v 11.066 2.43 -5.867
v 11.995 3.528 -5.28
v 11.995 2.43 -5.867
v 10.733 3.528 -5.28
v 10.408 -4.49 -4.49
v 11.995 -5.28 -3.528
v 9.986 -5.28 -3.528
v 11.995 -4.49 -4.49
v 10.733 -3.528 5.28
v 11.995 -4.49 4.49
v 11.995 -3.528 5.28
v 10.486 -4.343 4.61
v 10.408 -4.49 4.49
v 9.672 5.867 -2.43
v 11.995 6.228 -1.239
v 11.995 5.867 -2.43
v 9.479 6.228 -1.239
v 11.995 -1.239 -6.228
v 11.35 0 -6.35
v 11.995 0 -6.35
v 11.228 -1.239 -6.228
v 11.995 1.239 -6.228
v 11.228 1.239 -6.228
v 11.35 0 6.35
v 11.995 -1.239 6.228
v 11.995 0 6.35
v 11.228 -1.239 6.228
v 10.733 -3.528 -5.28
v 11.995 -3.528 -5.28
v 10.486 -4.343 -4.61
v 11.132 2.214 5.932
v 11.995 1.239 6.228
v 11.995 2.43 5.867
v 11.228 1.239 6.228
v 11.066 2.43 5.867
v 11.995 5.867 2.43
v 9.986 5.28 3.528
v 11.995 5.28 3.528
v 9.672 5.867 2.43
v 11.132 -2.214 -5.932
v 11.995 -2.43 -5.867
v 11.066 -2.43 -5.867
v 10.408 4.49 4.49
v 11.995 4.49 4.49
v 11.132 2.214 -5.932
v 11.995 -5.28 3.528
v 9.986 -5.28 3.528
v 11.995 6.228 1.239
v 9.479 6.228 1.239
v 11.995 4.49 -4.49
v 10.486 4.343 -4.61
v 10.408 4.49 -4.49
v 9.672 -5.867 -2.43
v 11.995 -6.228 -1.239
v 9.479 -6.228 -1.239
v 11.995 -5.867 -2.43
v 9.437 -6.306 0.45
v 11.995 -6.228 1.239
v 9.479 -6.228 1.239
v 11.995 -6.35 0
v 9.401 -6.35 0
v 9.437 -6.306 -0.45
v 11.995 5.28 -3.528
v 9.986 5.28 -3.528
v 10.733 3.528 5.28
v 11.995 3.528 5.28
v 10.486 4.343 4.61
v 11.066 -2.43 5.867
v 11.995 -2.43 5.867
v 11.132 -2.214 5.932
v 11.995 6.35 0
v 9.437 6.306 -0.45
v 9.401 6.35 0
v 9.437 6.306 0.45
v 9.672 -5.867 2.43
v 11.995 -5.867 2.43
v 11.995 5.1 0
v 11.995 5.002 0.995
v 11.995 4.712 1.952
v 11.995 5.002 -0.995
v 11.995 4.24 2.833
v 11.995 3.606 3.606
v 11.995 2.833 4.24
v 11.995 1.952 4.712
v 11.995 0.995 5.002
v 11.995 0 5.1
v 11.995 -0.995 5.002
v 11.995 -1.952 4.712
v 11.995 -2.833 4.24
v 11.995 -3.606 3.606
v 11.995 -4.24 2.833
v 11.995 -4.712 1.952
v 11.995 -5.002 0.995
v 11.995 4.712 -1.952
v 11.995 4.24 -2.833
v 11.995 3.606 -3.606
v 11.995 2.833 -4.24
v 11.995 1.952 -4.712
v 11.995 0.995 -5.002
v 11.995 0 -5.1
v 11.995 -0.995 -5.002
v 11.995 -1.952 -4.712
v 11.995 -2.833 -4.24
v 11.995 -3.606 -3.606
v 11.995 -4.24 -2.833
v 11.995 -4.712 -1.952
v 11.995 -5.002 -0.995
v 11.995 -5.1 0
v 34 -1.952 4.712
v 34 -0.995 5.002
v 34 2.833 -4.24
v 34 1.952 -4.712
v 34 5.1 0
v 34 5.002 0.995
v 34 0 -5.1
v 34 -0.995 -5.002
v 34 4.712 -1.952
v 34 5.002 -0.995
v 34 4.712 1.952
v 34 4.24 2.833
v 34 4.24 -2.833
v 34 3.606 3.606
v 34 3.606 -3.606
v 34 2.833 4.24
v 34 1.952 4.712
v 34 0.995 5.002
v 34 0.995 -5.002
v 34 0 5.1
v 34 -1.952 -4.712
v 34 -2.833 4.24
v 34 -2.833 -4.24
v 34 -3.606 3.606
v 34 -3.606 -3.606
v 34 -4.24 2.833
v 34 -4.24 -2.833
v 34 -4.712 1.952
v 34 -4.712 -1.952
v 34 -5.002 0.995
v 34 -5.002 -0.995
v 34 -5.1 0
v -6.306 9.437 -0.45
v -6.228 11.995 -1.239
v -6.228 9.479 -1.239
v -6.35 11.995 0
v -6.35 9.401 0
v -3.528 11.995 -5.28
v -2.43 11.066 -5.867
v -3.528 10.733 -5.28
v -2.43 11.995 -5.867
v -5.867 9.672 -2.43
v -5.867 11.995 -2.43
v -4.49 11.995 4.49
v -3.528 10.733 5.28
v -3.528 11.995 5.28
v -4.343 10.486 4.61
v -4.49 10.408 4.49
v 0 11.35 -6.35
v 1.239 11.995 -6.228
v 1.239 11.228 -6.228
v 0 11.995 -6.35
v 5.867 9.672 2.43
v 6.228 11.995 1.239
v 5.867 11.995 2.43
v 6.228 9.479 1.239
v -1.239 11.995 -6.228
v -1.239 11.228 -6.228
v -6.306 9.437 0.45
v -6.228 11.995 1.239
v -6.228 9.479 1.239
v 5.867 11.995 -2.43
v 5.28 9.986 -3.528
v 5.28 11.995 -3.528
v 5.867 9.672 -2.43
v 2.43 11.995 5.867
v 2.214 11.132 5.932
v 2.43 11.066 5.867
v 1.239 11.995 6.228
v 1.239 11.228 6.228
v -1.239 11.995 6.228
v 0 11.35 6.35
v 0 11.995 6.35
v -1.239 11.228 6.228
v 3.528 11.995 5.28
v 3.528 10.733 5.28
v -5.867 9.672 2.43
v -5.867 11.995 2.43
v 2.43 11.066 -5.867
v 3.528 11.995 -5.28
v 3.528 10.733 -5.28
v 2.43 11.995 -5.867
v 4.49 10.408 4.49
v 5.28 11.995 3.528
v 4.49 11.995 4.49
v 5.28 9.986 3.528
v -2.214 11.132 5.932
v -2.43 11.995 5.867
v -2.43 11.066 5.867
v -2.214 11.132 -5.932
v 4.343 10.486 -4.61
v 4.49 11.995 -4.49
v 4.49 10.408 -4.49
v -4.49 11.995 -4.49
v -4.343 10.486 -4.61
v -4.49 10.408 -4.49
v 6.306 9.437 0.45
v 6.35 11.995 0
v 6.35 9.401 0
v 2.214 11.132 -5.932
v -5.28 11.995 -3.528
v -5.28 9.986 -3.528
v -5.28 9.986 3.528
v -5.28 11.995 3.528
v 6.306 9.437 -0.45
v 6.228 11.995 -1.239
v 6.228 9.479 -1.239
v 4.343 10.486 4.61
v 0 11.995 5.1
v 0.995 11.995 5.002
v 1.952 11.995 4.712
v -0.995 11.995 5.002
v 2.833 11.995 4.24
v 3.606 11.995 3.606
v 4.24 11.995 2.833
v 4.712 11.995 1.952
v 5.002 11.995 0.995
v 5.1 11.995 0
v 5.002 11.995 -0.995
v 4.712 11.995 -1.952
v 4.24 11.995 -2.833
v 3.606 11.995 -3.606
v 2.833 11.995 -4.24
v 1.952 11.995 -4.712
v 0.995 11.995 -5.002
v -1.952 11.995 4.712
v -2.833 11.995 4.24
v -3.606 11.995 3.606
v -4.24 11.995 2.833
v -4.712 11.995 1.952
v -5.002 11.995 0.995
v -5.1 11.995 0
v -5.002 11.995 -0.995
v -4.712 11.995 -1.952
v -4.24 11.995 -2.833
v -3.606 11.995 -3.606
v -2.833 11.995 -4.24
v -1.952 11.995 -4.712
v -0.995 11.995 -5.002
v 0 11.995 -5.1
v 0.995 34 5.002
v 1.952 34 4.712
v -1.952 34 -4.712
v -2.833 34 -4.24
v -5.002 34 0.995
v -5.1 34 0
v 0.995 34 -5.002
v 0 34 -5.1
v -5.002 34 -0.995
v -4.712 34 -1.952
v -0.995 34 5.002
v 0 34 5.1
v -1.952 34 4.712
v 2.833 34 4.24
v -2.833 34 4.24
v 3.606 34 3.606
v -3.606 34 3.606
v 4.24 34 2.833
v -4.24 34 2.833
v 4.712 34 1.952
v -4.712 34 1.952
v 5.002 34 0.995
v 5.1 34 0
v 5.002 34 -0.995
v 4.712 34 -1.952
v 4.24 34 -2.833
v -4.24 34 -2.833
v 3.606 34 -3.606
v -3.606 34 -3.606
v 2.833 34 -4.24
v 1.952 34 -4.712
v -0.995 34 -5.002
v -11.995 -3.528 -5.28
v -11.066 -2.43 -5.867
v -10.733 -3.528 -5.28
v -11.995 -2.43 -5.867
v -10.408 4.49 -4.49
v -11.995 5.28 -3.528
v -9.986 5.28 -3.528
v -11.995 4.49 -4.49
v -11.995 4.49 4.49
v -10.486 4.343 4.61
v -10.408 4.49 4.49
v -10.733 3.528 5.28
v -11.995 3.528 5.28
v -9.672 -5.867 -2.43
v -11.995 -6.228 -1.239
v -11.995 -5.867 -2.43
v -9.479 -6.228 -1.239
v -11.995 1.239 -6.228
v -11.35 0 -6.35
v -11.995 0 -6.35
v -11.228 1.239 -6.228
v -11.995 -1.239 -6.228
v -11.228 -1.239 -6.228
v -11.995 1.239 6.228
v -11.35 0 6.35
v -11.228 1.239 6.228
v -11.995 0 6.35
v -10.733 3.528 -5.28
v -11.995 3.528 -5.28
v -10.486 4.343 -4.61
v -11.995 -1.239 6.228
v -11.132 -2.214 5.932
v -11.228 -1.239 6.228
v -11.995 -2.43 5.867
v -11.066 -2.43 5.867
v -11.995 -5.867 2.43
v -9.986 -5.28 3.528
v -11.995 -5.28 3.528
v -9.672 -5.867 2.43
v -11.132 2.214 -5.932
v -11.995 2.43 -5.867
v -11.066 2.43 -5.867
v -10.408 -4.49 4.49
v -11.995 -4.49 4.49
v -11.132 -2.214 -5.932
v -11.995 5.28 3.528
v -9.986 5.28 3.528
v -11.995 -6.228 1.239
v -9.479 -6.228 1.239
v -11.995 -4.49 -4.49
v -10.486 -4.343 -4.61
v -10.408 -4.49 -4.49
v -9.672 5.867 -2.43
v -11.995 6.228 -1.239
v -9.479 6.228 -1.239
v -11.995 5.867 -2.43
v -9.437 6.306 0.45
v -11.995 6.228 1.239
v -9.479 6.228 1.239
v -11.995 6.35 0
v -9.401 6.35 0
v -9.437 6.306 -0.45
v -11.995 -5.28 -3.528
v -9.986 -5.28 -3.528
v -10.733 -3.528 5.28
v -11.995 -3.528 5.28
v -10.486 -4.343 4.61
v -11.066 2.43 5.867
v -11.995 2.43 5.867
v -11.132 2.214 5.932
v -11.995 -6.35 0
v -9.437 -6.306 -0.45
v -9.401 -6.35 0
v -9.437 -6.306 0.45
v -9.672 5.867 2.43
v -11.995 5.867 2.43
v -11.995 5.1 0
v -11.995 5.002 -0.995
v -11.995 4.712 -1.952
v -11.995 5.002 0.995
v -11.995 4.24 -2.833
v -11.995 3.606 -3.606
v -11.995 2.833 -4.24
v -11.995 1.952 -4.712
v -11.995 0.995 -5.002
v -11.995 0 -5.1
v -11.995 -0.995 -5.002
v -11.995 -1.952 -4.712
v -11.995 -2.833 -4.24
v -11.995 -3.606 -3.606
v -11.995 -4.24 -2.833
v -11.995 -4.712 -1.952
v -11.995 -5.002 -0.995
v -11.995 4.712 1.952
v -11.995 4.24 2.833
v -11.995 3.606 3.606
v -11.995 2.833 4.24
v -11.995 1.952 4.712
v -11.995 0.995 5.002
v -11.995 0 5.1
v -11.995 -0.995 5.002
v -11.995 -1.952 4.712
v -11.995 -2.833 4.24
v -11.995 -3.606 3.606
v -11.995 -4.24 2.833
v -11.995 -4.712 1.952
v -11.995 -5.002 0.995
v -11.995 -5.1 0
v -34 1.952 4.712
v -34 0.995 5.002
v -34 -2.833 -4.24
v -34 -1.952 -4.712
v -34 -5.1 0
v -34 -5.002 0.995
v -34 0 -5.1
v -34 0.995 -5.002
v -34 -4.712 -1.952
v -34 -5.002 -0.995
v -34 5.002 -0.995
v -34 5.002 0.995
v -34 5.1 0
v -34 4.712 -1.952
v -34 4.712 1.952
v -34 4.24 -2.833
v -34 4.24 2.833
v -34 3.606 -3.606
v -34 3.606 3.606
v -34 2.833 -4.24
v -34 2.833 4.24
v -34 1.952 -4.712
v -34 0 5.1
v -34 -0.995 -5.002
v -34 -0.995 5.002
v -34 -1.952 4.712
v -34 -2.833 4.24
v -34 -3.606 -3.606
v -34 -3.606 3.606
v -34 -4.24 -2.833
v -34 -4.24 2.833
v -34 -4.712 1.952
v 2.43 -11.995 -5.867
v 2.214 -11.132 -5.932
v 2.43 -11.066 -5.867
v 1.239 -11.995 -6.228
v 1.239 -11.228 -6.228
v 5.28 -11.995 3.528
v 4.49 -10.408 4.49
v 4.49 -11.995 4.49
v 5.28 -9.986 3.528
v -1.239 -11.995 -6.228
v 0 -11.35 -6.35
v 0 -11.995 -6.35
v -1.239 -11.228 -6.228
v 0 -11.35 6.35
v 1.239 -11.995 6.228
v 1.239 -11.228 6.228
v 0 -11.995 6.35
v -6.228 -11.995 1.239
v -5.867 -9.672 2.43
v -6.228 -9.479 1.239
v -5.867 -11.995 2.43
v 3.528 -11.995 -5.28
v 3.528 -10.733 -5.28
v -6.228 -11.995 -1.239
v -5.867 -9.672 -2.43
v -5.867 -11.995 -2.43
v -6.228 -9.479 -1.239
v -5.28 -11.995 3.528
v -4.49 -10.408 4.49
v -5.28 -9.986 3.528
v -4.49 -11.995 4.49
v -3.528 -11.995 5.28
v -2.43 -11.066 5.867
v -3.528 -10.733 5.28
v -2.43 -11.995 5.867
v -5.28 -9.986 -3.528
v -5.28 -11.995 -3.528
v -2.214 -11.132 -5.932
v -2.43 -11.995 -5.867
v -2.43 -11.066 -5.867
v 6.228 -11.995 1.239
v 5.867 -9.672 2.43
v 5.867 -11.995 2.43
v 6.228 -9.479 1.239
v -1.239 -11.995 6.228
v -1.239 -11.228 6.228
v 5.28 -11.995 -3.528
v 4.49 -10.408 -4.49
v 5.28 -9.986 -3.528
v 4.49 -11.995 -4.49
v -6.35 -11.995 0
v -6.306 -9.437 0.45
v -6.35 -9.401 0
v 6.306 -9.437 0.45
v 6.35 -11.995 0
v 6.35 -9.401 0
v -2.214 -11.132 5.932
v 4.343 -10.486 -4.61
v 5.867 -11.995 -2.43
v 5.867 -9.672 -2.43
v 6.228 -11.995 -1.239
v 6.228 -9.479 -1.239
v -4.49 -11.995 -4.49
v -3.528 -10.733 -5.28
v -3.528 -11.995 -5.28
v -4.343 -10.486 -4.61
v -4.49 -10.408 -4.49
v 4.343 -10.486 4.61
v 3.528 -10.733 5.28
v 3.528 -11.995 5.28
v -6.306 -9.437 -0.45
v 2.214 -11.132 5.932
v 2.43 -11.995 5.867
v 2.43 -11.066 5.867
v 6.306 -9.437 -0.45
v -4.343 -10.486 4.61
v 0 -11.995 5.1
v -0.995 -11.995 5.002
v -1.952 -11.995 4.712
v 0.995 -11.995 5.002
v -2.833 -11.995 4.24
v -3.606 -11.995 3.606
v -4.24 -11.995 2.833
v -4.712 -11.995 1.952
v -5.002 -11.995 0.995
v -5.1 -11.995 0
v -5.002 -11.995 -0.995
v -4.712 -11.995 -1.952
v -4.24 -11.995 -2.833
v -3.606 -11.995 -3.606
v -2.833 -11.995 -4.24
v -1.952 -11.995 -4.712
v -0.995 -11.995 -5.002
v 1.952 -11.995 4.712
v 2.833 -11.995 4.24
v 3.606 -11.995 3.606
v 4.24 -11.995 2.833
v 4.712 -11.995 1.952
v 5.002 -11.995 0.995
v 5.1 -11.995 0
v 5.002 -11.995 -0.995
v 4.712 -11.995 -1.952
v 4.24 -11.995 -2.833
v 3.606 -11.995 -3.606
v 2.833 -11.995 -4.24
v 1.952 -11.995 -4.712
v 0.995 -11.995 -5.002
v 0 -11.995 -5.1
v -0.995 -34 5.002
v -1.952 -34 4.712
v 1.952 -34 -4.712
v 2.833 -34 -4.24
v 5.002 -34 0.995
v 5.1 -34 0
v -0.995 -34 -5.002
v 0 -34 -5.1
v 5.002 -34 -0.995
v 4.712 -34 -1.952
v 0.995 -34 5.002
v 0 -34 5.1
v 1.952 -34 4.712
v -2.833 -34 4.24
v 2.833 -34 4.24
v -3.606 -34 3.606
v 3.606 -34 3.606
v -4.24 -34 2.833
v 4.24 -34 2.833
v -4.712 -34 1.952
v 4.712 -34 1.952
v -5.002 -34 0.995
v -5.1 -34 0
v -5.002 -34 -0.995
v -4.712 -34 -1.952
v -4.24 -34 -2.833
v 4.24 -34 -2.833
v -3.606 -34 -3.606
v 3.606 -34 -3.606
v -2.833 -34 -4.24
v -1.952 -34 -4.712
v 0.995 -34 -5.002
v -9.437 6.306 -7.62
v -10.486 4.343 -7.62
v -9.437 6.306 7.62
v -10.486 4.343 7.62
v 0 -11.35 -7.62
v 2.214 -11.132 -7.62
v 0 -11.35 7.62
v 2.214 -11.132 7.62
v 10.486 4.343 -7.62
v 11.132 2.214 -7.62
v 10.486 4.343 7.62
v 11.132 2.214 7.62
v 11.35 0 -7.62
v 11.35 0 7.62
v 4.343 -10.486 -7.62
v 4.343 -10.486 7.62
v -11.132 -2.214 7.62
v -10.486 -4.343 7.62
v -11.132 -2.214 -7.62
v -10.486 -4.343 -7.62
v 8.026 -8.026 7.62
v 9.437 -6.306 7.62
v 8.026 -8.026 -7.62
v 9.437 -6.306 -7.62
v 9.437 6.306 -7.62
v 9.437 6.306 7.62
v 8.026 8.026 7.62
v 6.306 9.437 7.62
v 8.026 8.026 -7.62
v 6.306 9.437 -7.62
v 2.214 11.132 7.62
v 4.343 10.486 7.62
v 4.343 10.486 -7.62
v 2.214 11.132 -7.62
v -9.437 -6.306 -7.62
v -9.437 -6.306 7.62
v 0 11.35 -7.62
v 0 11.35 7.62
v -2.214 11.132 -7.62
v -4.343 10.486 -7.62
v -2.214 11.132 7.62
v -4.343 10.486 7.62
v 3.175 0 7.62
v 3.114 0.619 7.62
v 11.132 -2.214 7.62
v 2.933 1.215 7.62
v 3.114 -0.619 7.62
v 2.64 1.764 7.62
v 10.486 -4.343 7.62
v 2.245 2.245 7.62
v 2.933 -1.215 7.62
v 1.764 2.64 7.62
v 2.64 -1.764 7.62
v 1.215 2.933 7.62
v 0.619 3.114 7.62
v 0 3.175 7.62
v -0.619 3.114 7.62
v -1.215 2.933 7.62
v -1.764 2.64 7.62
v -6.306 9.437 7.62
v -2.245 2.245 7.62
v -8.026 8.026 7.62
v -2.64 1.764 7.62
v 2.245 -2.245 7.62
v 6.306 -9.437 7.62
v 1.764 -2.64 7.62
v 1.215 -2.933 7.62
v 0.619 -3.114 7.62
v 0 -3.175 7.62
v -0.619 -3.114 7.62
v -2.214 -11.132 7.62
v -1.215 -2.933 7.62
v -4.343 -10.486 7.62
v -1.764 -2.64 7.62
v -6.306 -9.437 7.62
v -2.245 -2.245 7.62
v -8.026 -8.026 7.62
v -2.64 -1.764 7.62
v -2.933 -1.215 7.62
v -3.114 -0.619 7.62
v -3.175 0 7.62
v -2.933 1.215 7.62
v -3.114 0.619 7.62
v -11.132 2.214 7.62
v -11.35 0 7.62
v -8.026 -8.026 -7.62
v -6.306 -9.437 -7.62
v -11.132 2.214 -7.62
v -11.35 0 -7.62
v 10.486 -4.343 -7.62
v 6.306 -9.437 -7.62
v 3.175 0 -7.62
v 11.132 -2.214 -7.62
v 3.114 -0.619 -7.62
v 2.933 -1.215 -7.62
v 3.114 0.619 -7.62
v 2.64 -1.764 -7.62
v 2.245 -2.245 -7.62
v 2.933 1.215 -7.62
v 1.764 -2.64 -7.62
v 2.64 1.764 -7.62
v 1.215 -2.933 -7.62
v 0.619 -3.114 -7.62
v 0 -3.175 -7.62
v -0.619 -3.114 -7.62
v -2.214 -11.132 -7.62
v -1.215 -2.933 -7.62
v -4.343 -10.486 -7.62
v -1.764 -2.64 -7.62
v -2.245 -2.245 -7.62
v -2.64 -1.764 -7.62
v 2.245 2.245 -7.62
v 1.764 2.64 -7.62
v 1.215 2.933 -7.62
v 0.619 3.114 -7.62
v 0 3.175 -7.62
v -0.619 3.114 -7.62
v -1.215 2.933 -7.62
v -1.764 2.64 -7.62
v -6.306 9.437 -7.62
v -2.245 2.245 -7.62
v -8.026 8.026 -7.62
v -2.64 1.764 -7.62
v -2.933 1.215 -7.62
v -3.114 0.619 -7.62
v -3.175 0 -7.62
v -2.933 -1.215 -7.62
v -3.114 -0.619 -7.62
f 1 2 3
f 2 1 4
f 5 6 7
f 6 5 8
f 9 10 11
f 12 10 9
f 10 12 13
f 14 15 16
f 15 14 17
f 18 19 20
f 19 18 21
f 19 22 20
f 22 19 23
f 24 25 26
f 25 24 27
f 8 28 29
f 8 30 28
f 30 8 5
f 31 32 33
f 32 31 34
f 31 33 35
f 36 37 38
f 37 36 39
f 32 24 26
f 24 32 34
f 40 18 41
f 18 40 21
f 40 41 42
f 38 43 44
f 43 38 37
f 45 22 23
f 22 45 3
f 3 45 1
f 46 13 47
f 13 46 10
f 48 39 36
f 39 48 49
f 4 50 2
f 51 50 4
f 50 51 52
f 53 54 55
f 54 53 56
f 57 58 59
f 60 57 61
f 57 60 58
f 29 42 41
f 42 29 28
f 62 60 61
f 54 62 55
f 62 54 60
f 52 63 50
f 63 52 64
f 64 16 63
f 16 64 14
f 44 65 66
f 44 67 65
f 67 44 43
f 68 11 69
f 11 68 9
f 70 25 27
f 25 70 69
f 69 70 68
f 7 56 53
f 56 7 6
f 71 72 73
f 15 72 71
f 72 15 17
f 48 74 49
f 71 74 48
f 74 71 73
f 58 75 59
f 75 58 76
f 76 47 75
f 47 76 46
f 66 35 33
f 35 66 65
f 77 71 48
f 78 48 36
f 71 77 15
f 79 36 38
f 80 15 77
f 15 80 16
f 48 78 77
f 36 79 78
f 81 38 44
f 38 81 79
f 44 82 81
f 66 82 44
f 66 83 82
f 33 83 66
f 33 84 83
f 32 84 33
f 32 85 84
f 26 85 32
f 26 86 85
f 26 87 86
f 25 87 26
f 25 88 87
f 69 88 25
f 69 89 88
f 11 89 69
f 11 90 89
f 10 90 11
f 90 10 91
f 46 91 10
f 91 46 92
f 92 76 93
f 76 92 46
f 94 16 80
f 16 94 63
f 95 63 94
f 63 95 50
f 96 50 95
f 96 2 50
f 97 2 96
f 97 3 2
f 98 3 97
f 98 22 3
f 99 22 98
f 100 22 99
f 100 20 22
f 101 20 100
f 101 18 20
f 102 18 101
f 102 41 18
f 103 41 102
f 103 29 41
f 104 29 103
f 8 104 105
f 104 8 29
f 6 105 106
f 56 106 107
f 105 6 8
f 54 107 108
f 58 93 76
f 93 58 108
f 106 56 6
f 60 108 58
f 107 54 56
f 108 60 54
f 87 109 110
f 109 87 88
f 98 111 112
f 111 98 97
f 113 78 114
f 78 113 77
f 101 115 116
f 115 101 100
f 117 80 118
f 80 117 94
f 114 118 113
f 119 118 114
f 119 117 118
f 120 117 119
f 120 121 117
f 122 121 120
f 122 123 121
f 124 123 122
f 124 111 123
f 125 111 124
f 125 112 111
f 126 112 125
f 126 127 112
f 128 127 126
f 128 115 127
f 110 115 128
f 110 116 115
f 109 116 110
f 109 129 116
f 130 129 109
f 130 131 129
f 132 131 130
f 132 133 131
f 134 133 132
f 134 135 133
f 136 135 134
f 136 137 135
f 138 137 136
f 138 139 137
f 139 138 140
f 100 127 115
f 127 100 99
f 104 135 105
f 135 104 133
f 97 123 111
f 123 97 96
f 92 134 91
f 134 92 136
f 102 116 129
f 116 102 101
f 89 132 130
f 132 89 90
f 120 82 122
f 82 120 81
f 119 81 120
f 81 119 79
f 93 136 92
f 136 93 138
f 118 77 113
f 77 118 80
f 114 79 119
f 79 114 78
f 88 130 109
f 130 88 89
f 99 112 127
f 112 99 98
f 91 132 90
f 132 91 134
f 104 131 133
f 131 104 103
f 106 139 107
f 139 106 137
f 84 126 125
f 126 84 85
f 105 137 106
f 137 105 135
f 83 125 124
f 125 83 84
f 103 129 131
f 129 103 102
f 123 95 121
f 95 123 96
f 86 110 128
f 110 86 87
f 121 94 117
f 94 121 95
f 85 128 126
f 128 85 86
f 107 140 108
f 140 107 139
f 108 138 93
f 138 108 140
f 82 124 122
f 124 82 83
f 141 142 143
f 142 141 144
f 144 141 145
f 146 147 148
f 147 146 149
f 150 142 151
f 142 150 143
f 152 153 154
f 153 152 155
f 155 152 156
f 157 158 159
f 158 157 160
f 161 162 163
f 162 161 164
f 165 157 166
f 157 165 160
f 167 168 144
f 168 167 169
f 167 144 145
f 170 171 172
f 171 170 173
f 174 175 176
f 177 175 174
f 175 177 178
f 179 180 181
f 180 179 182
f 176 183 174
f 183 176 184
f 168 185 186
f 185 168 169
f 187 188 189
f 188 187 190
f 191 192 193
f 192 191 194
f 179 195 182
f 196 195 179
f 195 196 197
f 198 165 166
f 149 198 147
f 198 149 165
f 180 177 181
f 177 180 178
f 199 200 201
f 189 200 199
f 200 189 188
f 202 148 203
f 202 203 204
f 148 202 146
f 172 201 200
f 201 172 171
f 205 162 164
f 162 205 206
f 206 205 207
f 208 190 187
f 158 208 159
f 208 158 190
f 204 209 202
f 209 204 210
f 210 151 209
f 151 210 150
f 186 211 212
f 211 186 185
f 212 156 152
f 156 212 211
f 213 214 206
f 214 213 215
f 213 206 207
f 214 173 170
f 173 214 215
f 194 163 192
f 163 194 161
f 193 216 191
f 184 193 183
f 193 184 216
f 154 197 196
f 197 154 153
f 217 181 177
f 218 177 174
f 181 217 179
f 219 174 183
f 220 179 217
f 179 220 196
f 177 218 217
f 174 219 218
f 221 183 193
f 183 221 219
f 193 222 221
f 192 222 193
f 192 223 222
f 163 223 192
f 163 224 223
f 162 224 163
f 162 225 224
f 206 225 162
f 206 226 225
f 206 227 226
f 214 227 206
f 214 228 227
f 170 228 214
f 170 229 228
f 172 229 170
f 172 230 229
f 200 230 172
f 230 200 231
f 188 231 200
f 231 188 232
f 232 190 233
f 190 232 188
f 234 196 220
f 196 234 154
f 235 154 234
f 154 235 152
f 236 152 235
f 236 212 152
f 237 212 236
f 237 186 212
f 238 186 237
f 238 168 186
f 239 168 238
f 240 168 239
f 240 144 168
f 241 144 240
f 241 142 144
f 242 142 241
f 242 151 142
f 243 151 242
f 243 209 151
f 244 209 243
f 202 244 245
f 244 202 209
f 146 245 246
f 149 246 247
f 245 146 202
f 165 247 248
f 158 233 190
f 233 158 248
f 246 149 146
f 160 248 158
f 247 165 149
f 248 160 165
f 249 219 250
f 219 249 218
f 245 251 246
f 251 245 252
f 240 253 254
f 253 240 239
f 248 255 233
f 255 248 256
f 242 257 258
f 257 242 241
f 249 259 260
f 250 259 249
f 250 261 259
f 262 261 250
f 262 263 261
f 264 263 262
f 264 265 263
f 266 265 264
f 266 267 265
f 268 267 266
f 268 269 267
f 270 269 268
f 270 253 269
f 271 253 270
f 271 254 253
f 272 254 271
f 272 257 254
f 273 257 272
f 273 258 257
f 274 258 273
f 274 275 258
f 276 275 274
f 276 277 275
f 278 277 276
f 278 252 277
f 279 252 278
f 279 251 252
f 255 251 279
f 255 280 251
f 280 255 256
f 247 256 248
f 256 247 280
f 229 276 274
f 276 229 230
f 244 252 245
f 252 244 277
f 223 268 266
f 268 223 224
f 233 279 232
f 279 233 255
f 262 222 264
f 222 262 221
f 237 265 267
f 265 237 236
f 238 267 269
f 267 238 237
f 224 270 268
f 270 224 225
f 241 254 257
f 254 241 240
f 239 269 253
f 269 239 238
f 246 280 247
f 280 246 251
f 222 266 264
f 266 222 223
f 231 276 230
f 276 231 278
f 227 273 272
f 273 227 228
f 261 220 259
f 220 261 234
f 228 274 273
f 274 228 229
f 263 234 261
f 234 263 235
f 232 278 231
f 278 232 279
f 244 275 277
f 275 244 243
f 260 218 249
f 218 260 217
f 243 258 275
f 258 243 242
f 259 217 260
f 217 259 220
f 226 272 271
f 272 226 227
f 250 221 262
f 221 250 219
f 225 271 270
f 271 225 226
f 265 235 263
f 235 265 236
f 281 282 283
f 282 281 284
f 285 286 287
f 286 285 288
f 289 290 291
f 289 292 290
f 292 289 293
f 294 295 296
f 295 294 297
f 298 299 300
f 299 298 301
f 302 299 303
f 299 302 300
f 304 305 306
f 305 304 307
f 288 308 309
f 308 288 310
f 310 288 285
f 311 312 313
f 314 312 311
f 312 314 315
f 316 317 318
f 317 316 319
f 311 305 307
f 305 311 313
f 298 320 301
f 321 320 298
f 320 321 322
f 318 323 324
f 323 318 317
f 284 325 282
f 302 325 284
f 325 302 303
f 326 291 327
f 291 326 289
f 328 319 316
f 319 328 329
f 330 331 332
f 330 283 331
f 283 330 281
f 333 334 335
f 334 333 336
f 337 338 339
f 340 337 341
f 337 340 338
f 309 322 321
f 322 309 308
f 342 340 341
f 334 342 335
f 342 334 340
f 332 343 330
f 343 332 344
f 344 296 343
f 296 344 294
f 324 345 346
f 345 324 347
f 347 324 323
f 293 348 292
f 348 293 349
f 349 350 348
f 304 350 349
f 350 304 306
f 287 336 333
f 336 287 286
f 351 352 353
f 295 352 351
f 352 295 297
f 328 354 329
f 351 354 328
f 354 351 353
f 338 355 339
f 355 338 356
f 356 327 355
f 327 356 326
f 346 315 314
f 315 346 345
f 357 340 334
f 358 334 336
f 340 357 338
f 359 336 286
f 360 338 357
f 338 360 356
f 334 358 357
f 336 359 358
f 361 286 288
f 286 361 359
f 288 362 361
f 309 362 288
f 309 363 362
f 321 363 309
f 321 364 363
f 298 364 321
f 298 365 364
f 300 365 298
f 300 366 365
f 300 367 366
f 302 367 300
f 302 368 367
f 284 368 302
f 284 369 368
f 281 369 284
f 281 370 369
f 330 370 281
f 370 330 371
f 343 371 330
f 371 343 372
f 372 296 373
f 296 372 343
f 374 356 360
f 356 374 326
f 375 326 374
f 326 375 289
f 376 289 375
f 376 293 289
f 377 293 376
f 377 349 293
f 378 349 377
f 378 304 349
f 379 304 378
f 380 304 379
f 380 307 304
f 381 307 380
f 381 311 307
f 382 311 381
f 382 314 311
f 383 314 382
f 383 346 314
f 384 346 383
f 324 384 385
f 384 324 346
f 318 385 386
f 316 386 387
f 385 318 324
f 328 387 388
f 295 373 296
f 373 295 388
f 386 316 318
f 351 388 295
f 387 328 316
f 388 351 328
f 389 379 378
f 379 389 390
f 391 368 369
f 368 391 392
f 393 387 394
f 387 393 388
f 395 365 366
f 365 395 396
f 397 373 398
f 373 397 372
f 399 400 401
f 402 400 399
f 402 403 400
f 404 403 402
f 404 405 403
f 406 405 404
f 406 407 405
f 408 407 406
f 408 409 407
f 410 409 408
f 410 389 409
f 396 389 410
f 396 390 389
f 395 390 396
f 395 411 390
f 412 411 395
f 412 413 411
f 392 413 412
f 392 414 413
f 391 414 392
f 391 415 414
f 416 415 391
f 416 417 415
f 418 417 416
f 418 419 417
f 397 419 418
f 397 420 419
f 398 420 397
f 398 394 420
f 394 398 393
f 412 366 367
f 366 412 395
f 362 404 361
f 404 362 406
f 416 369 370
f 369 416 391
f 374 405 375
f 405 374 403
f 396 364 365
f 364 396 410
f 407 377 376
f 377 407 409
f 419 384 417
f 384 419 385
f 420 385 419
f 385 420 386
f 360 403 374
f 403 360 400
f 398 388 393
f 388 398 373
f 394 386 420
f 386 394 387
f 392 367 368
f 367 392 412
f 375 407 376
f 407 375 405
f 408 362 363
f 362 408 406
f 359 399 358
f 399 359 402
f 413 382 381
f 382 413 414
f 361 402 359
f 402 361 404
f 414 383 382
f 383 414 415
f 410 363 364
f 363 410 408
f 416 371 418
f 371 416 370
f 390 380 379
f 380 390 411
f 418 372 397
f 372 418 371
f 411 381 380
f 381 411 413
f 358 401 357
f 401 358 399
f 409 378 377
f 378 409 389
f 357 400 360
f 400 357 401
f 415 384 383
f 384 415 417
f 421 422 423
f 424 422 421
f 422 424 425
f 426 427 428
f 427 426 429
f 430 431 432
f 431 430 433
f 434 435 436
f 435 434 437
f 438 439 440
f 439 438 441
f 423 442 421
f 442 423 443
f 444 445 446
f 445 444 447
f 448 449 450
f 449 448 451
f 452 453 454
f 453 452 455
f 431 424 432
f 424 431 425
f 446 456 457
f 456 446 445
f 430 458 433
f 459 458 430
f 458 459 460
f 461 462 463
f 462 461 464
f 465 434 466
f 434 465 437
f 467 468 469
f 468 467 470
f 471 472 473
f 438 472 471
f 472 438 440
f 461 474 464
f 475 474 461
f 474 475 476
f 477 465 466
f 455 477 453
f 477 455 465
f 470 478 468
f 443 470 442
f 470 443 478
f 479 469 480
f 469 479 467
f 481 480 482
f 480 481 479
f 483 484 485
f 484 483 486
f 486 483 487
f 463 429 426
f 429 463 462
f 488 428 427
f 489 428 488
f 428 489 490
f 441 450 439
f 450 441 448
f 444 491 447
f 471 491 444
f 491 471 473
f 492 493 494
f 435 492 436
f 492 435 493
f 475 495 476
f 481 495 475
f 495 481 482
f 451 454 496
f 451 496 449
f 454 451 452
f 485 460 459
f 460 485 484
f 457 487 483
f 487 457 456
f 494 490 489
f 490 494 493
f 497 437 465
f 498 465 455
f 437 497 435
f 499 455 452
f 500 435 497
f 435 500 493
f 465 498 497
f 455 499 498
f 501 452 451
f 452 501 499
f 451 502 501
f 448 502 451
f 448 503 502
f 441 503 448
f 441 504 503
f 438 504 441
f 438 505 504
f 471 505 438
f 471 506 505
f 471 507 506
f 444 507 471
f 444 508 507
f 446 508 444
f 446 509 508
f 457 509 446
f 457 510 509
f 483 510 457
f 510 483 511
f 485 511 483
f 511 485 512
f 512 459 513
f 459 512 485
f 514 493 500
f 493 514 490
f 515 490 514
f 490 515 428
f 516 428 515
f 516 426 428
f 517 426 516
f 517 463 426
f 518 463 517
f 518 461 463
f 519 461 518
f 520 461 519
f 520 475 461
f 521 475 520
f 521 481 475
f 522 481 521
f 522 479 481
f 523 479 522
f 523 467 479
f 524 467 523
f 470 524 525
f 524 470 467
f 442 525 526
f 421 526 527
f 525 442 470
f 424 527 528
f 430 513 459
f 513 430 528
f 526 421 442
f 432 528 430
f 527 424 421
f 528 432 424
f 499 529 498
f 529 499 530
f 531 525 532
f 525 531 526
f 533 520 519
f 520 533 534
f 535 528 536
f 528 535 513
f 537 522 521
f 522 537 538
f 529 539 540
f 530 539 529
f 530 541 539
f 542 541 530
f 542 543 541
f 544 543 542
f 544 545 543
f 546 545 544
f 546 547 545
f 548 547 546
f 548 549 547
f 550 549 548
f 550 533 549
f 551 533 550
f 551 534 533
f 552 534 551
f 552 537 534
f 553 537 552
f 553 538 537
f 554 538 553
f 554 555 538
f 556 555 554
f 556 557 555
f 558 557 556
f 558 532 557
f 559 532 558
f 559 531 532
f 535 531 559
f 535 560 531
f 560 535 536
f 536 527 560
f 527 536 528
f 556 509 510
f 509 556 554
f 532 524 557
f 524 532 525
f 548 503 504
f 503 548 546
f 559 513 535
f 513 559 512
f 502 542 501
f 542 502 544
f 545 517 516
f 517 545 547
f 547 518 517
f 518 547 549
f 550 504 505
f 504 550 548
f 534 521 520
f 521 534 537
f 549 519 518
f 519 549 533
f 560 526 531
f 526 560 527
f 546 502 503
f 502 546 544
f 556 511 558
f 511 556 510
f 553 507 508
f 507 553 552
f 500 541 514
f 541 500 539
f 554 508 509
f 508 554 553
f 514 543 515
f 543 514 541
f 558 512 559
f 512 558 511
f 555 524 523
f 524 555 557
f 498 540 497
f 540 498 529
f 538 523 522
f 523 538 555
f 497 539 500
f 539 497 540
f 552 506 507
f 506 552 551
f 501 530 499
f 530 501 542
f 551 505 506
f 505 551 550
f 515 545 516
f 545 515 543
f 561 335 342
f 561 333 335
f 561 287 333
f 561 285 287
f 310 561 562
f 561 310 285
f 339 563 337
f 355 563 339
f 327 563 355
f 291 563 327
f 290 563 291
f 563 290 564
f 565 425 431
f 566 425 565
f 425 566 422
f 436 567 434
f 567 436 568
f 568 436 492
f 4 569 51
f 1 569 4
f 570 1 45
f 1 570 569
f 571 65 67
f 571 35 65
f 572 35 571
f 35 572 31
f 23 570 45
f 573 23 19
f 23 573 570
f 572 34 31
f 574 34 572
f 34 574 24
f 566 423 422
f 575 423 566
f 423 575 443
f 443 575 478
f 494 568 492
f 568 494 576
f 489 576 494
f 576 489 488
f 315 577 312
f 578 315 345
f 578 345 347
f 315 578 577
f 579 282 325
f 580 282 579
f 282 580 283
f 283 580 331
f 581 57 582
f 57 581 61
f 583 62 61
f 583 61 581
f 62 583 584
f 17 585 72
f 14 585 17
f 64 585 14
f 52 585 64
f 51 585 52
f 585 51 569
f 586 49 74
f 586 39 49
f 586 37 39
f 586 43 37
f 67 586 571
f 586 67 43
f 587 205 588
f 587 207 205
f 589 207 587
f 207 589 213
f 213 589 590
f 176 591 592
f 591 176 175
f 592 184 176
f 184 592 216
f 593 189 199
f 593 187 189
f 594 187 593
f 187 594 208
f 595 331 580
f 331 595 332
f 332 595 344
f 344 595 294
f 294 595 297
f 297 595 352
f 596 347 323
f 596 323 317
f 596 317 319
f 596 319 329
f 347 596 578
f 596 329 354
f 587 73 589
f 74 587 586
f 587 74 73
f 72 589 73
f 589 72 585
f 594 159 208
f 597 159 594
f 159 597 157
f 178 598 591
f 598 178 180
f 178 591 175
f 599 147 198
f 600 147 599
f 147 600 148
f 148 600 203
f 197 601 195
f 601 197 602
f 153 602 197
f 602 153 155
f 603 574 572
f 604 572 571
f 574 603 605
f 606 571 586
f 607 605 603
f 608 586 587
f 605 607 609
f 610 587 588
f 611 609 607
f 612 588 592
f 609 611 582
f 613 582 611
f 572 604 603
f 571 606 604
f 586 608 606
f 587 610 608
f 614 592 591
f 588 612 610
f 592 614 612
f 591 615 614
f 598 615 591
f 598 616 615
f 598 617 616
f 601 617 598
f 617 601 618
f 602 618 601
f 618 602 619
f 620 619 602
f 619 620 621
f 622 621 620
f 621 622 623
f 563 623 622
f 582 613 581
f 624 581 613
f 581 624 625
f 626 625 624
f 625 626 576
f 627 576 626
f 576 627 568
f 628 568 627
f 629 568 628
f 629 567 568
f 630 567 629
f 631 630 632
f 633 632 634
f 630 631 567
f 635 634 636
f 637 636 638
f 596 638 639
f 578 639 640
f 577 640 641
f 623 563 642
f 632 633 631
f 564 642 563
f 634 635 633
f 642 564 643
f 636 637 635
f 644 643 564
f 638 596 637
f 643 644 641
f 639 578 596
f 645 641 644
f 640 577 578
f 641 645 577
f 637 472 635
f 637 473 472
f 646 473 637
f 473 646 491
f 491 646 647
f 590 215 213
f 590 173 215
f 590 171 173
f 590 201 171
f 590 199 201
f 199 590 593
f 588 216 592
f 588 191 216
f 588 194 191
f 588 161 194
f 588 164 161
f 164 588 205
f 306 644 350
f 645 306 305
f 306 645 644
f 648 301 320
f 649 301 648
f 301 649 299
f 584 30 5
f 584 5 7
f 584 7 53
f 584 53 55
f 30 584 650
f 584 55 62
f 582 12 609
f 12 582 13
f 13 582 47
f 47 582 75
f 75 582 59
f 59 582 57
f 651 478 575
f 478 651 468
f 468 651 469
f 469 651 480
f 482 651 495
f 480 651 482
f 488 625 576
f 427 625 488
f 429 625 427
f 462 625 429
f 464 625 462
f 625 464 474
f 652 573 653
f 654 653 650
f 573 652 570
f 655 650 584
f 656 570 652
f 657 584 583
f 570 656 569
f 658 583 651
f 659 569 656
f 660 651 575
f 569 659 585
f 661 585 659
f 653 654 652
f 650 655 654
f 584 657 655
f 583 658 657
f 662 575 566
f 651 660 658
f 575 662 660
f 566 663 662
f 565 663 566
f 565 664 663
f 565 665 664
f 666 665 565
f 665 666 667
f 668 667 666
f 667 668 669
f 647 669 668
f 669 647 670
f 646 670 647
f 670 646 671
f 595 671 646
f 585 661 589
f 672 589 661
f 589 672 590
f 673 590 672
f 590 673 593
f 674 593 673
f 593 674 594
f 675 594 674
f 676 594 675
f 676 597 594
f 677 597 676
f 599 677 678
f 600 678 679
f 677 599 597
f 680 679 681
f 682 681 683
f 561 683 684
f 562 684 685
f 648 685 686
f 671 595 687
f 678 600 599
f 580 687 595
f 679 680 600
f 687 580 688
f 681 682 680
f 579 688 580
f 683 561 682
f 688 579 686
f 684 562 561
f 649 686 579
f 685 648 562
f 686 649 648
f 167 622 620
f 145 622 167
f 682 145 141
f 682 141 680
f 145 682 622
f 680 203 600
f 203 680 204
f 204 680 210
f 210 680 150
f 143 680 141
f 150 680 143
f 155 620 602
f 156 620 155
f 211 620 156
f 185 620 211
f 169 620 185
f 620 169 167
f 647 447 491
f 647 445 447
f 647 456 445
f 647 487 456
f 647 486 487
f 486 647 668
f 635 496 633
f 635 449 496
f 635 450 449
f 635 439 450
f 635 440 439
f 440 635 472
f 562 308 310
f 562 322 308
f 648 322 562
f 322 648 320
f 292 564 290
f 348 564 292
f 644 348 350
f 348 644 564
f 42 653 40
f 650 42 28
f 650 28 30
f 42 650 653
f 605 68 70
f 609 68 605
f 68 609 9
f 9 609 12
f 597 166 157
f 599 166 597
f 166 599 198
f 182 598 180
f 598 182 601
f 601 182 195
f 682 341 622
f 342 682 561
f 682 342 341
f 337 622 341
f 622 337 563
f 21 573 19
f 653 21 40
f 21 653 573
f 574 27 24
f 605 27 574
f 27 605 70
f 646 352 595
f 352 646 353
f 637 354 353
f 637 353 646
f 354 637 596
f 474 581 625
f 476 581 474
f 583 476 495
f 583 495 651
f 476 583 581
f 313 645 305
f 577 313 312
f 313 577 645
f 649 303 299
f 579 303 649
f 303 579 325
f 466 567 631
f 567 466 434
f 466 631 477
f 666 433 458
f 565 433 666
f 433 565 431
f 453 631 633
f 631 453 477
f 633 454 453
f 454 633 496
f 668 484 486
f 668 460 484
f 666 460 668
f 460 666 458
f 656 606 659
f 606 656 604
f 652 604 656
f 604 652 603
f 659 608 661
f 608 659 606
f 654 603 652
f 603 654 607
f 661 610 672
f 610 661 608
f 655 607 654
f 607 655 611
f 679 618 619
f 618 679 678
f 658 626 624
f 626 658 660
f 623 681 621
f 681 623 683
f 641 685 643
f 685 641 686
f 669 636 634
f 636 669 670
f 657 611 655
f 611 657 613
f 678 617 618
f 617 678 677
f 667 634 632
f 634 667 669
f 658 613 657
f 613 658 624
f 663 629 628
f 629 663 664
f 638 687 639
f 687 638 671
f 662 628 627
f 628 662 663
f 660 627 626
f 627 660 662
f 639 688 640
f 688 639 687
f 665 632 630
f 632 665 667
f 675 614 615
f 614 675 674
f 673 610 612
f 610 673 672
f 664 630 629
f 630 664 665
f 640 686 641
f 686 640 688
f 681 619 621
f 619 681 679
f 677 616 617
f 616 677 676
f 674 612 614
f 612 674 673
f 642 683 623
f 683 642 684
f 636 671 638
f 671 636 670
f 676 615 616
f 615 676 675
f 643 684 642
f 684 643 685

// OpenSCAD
$fn = 32;

// ----------------------------------------------------------------------
// Cardan cross: 68 mm span, 12.7 mm trunnions
// ----------------------------------------------------------------------

// --- parameters (mm) ---
journal_d = 12.7;         // trunnion diameter
arm_len = 34;             // trunnion length from the centre
step_r = 4.32;            // step position from the centre
step_d = 10.2;            // journal diameter after the step
hub_d = 22.7;             // hub diameter
hub_h = 15.24;            // hub height
bore_d = 6.35;            // hub bore

difference() {
  union() {
    /* hub along the joint axis */
    cylinder(h = hub_h, d = hub_d, center = true);
    for (a = [0 : 90 : 270]) rotate([0, 0, a]) {
      /* trunnion, sunk into the hub */
      translate([hub_d / 4, 0, 0]) rotate([0, 90, 0]) cylinder(h = step_r + 2, d = journal_d);
      /* stepped journal out to the tip */
      translate([step_r - 0.5, 0, 0]) rotate([0, 90, 0]) cylinder(h = arm_len + 0.5 - step_r, d = step_d);
    }
  }
  /* lubrication bore through the hub, 2.5 mm clear on both sides */
  translate([0, 0, -hub_h / 2 - 2.5]) cylinder(h = hub_h + 5, d = bore_d);
}
